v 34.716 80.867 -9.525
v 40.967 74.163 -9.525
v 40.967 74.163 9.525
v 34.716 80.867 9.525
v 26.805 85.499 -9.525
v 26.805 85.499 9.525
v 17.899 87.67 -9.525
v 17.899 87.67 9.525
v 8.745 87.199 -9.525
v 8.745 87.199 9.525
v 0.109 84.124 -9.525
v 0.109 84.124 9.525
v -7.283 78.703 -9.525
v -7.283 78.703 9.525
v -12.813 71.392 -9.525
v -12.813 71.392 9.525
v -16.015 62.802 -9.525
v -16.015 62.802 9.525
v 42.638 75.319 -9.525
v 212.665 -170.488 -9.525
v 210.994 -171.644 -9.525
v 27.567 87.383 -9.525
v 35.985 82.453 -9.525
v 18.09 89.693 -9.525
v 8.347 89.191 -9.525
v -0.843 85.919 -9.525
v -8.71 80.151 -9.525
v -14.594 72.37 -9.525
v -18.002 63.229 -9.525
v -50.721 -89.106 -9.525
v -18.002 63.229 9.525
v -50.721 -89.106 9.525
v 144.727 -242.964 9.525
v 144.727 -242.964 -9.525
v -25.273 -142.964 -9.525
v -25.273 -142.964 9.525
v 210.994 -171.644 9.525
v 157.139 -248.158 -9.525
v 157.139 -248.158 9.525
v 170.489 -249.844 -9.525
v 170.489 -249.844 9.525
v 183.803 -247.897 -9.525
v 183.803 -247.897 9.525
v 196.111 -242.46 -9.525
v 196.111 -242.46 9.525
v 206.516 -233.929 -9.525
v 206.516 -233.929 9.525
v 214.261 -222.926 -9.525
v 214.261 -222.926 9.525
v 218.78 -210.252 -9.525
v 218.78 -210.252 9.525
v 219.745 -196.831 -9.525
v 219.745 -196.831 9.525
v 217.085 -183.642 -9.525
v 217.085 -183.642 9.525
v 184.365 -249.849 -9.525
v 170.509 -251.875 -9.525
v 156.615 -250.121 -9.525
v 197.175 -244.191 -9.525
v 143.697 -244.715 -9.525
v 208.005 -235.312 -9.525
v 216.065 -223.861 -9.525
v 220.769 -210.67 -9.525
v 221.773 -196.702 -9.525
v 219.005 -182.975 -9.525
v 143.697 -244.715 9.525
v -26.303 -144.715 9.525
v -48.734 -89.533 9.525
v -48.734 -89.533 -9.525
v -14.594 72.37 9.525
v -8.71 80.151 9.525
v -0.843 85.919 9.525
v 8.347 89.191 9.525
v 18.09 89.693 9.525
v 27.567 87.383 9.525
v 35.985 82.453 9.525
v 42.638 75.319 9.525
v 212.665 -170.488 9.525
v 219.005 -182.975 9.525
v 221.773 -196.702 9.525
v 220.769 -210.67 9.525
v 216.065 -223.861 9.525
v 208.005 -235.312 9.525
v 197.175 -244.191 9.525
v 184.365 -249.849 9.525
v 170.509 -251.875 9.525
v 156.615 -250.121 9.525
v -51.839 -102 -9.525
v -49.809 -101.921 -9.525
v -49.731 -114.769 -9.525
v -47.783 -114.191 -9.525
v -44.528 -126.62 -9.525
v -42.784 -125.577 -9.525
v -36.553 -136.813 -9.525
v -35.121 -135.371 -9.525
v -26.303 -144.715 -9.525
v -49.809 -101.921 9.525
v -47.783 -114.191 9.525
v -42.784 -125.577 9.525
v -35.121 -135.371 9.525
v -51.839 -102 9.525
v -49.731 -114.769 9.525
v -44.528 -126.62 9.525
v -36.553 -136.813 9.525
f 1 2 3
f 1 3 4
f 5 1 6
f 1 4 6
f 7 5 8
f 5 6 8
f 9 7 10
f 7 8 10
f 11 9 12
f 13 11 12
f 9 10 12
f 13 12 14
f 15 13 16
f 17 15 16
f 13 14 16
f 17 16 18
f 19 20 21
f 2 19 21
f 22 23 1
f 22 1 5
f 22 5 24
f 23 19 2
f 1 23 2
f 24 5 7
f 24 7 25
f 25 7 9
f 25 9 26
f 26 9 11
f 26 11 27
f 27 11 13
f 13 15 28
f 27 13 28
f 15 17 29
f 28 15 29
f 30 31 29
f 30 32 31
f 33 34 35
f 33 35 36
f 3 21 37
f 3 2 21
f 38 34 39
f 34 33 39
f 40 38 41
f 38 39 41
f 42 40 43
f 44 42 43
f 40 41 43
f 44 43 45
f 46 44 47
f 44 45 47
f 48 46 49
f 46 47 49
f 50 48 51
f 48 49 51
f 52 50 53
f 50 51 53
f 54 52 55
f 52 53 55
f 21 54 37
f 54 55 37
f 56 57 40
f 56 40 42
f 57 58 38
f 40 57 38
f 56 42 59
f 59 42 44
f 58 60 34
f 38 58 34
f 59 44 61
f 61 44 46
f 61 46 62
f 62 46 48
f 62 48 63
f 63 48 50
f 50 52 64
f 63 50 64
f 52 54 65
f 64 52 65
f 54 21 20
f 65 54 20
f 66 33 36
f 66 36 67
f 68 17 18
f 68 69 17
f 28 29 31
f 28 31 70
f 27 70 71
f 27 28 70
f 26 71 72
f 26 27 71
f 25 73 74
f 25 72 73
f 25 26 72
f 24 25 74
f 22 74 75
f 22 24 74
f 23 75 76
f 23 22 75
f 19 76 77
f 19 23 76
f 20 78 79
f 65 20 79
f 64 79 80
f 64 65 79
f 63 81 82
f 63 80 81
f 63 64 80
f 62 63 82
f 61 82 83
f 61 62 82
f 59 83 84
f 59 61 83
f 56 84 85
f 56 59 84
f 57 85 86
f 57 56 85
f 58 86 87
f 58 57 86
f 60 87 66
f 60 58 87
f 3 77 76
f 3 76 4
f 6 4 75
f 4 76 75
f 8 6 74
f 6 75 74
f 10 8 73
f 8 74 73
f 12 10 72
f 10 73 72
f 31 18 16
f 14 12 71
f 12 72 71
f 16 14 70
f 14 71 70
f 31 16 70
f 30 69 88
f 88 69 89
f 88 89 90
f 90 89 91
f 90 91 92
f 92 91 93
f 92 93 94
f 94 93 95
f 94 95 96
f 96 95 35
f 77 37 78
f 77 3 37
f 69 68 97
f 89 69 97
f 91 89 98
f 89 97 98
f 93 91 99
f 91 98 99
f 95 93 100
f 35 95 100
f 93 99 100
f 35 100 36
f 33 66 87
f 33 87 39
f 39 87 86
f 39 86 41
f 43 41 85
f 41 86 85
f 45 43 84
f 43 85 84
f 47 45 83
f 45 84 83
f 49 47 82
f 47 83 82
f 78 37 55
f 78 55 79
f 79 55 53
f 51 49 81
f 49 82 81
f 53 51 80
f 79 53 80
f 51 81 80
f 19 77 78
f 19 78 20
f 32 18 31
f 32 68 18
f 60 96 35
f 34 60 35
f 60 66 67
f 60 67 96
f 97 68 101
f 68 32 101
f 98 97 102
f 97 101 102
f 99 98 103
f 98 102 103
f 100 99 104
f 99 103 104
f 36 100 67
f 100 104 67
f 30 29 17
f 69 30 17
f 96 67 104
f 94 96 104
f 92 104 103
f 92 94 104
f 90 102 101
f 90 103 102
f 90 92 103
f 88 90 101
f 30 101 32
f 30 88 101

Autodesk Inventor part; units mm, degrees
sketch "Эскизная траектория" plane through (0, 0, 0) normal (0, 0, 1) x (1, 0, 0)
  arc A0 (41.531, 74.5528) -> (-16.6855, 62.9464) centre (14.9336, 56.1551) ccw
  arc A1 (144.3794, -243.555) -> (211.5583, -171.2536) centre (170, -200) ccw
  arc A2 (-49.4049, -89.3885) -> (-25.6206, -143.555) centre (0, -100) ccw
  line L0 (-49.4049, -89.3885) -> (-16.6855, 62.9464)
  line L1 (41.531, 74.5528) -> (211.5583, -171.2536)
  line L2 (144.3794, -243.555) -> (-25.6206, -143.555)
ref_plane "Плоскость сечения" through (-16.6855, 62.9464, 0) normal (-0.21, -0.9777, 0) x (0, 0, 1)
ref_plane "РабПлоскость2" through (14.9336, 56.1551, 0) normal (-1, 0, 0) x (0, 0, 1)
ref_plane "РабПлоскость3" through (170, -200, 0) normal (-0.5674, 0.8234, 0) x (0, 0, 1)
ref_plane "РабПлоскость4" through (0, -100, 0) normal (0.7593, -0.6507, 0) x (0, 0, 1)
sketch "Сечение" plane through (-16.6855, 62.9464, 0) normal (-0.21, -0.9777, 0) x (0, 0, 1)
  line L0 (-9.525, 1.3462) -> (9.525, 1.3462)
  line L1 (9.525, 1.3462) -> (9.525, -0.6858)
  line L2 (9.525, -0.6858) -> (-9.525, -0.6858)
  line L3 (-9.525, -0.6858) -> (-9.525, 1.3462)
  line L4 (-9.525, 0) -> (9.525, 0) construction
  point P0 (0, 0)
  point P1 (0, 0)
  dimension "d0" = 19.05
  dimension "d4" = 0.6858
  dimension "d5" = 1.3462
sweep "Ремень" add profiles "Сечение" path "Эскизная траектория"
equation "\"d0\" = da_B"
equation "\"d4\" = da_a"
equation "\"d5\" = da_a2"
equation "\"da_B\" = 19.05"
equation "\"da_pb\" = 12.7"
equation "\"da_L\" = 927.12858"
equation "\"da_a\" = 0.6858"
equation "\"da_S\" = 6.1214"
equation "\"da_Beta\" = 20deg"
equation "\"da_Ht\" = 2.286"
equation "\"da_H\" = 4.318"
equation "\"da_a2\" = 1.3462"
properties part number "Зубчатый ремень" material "Rubber"
